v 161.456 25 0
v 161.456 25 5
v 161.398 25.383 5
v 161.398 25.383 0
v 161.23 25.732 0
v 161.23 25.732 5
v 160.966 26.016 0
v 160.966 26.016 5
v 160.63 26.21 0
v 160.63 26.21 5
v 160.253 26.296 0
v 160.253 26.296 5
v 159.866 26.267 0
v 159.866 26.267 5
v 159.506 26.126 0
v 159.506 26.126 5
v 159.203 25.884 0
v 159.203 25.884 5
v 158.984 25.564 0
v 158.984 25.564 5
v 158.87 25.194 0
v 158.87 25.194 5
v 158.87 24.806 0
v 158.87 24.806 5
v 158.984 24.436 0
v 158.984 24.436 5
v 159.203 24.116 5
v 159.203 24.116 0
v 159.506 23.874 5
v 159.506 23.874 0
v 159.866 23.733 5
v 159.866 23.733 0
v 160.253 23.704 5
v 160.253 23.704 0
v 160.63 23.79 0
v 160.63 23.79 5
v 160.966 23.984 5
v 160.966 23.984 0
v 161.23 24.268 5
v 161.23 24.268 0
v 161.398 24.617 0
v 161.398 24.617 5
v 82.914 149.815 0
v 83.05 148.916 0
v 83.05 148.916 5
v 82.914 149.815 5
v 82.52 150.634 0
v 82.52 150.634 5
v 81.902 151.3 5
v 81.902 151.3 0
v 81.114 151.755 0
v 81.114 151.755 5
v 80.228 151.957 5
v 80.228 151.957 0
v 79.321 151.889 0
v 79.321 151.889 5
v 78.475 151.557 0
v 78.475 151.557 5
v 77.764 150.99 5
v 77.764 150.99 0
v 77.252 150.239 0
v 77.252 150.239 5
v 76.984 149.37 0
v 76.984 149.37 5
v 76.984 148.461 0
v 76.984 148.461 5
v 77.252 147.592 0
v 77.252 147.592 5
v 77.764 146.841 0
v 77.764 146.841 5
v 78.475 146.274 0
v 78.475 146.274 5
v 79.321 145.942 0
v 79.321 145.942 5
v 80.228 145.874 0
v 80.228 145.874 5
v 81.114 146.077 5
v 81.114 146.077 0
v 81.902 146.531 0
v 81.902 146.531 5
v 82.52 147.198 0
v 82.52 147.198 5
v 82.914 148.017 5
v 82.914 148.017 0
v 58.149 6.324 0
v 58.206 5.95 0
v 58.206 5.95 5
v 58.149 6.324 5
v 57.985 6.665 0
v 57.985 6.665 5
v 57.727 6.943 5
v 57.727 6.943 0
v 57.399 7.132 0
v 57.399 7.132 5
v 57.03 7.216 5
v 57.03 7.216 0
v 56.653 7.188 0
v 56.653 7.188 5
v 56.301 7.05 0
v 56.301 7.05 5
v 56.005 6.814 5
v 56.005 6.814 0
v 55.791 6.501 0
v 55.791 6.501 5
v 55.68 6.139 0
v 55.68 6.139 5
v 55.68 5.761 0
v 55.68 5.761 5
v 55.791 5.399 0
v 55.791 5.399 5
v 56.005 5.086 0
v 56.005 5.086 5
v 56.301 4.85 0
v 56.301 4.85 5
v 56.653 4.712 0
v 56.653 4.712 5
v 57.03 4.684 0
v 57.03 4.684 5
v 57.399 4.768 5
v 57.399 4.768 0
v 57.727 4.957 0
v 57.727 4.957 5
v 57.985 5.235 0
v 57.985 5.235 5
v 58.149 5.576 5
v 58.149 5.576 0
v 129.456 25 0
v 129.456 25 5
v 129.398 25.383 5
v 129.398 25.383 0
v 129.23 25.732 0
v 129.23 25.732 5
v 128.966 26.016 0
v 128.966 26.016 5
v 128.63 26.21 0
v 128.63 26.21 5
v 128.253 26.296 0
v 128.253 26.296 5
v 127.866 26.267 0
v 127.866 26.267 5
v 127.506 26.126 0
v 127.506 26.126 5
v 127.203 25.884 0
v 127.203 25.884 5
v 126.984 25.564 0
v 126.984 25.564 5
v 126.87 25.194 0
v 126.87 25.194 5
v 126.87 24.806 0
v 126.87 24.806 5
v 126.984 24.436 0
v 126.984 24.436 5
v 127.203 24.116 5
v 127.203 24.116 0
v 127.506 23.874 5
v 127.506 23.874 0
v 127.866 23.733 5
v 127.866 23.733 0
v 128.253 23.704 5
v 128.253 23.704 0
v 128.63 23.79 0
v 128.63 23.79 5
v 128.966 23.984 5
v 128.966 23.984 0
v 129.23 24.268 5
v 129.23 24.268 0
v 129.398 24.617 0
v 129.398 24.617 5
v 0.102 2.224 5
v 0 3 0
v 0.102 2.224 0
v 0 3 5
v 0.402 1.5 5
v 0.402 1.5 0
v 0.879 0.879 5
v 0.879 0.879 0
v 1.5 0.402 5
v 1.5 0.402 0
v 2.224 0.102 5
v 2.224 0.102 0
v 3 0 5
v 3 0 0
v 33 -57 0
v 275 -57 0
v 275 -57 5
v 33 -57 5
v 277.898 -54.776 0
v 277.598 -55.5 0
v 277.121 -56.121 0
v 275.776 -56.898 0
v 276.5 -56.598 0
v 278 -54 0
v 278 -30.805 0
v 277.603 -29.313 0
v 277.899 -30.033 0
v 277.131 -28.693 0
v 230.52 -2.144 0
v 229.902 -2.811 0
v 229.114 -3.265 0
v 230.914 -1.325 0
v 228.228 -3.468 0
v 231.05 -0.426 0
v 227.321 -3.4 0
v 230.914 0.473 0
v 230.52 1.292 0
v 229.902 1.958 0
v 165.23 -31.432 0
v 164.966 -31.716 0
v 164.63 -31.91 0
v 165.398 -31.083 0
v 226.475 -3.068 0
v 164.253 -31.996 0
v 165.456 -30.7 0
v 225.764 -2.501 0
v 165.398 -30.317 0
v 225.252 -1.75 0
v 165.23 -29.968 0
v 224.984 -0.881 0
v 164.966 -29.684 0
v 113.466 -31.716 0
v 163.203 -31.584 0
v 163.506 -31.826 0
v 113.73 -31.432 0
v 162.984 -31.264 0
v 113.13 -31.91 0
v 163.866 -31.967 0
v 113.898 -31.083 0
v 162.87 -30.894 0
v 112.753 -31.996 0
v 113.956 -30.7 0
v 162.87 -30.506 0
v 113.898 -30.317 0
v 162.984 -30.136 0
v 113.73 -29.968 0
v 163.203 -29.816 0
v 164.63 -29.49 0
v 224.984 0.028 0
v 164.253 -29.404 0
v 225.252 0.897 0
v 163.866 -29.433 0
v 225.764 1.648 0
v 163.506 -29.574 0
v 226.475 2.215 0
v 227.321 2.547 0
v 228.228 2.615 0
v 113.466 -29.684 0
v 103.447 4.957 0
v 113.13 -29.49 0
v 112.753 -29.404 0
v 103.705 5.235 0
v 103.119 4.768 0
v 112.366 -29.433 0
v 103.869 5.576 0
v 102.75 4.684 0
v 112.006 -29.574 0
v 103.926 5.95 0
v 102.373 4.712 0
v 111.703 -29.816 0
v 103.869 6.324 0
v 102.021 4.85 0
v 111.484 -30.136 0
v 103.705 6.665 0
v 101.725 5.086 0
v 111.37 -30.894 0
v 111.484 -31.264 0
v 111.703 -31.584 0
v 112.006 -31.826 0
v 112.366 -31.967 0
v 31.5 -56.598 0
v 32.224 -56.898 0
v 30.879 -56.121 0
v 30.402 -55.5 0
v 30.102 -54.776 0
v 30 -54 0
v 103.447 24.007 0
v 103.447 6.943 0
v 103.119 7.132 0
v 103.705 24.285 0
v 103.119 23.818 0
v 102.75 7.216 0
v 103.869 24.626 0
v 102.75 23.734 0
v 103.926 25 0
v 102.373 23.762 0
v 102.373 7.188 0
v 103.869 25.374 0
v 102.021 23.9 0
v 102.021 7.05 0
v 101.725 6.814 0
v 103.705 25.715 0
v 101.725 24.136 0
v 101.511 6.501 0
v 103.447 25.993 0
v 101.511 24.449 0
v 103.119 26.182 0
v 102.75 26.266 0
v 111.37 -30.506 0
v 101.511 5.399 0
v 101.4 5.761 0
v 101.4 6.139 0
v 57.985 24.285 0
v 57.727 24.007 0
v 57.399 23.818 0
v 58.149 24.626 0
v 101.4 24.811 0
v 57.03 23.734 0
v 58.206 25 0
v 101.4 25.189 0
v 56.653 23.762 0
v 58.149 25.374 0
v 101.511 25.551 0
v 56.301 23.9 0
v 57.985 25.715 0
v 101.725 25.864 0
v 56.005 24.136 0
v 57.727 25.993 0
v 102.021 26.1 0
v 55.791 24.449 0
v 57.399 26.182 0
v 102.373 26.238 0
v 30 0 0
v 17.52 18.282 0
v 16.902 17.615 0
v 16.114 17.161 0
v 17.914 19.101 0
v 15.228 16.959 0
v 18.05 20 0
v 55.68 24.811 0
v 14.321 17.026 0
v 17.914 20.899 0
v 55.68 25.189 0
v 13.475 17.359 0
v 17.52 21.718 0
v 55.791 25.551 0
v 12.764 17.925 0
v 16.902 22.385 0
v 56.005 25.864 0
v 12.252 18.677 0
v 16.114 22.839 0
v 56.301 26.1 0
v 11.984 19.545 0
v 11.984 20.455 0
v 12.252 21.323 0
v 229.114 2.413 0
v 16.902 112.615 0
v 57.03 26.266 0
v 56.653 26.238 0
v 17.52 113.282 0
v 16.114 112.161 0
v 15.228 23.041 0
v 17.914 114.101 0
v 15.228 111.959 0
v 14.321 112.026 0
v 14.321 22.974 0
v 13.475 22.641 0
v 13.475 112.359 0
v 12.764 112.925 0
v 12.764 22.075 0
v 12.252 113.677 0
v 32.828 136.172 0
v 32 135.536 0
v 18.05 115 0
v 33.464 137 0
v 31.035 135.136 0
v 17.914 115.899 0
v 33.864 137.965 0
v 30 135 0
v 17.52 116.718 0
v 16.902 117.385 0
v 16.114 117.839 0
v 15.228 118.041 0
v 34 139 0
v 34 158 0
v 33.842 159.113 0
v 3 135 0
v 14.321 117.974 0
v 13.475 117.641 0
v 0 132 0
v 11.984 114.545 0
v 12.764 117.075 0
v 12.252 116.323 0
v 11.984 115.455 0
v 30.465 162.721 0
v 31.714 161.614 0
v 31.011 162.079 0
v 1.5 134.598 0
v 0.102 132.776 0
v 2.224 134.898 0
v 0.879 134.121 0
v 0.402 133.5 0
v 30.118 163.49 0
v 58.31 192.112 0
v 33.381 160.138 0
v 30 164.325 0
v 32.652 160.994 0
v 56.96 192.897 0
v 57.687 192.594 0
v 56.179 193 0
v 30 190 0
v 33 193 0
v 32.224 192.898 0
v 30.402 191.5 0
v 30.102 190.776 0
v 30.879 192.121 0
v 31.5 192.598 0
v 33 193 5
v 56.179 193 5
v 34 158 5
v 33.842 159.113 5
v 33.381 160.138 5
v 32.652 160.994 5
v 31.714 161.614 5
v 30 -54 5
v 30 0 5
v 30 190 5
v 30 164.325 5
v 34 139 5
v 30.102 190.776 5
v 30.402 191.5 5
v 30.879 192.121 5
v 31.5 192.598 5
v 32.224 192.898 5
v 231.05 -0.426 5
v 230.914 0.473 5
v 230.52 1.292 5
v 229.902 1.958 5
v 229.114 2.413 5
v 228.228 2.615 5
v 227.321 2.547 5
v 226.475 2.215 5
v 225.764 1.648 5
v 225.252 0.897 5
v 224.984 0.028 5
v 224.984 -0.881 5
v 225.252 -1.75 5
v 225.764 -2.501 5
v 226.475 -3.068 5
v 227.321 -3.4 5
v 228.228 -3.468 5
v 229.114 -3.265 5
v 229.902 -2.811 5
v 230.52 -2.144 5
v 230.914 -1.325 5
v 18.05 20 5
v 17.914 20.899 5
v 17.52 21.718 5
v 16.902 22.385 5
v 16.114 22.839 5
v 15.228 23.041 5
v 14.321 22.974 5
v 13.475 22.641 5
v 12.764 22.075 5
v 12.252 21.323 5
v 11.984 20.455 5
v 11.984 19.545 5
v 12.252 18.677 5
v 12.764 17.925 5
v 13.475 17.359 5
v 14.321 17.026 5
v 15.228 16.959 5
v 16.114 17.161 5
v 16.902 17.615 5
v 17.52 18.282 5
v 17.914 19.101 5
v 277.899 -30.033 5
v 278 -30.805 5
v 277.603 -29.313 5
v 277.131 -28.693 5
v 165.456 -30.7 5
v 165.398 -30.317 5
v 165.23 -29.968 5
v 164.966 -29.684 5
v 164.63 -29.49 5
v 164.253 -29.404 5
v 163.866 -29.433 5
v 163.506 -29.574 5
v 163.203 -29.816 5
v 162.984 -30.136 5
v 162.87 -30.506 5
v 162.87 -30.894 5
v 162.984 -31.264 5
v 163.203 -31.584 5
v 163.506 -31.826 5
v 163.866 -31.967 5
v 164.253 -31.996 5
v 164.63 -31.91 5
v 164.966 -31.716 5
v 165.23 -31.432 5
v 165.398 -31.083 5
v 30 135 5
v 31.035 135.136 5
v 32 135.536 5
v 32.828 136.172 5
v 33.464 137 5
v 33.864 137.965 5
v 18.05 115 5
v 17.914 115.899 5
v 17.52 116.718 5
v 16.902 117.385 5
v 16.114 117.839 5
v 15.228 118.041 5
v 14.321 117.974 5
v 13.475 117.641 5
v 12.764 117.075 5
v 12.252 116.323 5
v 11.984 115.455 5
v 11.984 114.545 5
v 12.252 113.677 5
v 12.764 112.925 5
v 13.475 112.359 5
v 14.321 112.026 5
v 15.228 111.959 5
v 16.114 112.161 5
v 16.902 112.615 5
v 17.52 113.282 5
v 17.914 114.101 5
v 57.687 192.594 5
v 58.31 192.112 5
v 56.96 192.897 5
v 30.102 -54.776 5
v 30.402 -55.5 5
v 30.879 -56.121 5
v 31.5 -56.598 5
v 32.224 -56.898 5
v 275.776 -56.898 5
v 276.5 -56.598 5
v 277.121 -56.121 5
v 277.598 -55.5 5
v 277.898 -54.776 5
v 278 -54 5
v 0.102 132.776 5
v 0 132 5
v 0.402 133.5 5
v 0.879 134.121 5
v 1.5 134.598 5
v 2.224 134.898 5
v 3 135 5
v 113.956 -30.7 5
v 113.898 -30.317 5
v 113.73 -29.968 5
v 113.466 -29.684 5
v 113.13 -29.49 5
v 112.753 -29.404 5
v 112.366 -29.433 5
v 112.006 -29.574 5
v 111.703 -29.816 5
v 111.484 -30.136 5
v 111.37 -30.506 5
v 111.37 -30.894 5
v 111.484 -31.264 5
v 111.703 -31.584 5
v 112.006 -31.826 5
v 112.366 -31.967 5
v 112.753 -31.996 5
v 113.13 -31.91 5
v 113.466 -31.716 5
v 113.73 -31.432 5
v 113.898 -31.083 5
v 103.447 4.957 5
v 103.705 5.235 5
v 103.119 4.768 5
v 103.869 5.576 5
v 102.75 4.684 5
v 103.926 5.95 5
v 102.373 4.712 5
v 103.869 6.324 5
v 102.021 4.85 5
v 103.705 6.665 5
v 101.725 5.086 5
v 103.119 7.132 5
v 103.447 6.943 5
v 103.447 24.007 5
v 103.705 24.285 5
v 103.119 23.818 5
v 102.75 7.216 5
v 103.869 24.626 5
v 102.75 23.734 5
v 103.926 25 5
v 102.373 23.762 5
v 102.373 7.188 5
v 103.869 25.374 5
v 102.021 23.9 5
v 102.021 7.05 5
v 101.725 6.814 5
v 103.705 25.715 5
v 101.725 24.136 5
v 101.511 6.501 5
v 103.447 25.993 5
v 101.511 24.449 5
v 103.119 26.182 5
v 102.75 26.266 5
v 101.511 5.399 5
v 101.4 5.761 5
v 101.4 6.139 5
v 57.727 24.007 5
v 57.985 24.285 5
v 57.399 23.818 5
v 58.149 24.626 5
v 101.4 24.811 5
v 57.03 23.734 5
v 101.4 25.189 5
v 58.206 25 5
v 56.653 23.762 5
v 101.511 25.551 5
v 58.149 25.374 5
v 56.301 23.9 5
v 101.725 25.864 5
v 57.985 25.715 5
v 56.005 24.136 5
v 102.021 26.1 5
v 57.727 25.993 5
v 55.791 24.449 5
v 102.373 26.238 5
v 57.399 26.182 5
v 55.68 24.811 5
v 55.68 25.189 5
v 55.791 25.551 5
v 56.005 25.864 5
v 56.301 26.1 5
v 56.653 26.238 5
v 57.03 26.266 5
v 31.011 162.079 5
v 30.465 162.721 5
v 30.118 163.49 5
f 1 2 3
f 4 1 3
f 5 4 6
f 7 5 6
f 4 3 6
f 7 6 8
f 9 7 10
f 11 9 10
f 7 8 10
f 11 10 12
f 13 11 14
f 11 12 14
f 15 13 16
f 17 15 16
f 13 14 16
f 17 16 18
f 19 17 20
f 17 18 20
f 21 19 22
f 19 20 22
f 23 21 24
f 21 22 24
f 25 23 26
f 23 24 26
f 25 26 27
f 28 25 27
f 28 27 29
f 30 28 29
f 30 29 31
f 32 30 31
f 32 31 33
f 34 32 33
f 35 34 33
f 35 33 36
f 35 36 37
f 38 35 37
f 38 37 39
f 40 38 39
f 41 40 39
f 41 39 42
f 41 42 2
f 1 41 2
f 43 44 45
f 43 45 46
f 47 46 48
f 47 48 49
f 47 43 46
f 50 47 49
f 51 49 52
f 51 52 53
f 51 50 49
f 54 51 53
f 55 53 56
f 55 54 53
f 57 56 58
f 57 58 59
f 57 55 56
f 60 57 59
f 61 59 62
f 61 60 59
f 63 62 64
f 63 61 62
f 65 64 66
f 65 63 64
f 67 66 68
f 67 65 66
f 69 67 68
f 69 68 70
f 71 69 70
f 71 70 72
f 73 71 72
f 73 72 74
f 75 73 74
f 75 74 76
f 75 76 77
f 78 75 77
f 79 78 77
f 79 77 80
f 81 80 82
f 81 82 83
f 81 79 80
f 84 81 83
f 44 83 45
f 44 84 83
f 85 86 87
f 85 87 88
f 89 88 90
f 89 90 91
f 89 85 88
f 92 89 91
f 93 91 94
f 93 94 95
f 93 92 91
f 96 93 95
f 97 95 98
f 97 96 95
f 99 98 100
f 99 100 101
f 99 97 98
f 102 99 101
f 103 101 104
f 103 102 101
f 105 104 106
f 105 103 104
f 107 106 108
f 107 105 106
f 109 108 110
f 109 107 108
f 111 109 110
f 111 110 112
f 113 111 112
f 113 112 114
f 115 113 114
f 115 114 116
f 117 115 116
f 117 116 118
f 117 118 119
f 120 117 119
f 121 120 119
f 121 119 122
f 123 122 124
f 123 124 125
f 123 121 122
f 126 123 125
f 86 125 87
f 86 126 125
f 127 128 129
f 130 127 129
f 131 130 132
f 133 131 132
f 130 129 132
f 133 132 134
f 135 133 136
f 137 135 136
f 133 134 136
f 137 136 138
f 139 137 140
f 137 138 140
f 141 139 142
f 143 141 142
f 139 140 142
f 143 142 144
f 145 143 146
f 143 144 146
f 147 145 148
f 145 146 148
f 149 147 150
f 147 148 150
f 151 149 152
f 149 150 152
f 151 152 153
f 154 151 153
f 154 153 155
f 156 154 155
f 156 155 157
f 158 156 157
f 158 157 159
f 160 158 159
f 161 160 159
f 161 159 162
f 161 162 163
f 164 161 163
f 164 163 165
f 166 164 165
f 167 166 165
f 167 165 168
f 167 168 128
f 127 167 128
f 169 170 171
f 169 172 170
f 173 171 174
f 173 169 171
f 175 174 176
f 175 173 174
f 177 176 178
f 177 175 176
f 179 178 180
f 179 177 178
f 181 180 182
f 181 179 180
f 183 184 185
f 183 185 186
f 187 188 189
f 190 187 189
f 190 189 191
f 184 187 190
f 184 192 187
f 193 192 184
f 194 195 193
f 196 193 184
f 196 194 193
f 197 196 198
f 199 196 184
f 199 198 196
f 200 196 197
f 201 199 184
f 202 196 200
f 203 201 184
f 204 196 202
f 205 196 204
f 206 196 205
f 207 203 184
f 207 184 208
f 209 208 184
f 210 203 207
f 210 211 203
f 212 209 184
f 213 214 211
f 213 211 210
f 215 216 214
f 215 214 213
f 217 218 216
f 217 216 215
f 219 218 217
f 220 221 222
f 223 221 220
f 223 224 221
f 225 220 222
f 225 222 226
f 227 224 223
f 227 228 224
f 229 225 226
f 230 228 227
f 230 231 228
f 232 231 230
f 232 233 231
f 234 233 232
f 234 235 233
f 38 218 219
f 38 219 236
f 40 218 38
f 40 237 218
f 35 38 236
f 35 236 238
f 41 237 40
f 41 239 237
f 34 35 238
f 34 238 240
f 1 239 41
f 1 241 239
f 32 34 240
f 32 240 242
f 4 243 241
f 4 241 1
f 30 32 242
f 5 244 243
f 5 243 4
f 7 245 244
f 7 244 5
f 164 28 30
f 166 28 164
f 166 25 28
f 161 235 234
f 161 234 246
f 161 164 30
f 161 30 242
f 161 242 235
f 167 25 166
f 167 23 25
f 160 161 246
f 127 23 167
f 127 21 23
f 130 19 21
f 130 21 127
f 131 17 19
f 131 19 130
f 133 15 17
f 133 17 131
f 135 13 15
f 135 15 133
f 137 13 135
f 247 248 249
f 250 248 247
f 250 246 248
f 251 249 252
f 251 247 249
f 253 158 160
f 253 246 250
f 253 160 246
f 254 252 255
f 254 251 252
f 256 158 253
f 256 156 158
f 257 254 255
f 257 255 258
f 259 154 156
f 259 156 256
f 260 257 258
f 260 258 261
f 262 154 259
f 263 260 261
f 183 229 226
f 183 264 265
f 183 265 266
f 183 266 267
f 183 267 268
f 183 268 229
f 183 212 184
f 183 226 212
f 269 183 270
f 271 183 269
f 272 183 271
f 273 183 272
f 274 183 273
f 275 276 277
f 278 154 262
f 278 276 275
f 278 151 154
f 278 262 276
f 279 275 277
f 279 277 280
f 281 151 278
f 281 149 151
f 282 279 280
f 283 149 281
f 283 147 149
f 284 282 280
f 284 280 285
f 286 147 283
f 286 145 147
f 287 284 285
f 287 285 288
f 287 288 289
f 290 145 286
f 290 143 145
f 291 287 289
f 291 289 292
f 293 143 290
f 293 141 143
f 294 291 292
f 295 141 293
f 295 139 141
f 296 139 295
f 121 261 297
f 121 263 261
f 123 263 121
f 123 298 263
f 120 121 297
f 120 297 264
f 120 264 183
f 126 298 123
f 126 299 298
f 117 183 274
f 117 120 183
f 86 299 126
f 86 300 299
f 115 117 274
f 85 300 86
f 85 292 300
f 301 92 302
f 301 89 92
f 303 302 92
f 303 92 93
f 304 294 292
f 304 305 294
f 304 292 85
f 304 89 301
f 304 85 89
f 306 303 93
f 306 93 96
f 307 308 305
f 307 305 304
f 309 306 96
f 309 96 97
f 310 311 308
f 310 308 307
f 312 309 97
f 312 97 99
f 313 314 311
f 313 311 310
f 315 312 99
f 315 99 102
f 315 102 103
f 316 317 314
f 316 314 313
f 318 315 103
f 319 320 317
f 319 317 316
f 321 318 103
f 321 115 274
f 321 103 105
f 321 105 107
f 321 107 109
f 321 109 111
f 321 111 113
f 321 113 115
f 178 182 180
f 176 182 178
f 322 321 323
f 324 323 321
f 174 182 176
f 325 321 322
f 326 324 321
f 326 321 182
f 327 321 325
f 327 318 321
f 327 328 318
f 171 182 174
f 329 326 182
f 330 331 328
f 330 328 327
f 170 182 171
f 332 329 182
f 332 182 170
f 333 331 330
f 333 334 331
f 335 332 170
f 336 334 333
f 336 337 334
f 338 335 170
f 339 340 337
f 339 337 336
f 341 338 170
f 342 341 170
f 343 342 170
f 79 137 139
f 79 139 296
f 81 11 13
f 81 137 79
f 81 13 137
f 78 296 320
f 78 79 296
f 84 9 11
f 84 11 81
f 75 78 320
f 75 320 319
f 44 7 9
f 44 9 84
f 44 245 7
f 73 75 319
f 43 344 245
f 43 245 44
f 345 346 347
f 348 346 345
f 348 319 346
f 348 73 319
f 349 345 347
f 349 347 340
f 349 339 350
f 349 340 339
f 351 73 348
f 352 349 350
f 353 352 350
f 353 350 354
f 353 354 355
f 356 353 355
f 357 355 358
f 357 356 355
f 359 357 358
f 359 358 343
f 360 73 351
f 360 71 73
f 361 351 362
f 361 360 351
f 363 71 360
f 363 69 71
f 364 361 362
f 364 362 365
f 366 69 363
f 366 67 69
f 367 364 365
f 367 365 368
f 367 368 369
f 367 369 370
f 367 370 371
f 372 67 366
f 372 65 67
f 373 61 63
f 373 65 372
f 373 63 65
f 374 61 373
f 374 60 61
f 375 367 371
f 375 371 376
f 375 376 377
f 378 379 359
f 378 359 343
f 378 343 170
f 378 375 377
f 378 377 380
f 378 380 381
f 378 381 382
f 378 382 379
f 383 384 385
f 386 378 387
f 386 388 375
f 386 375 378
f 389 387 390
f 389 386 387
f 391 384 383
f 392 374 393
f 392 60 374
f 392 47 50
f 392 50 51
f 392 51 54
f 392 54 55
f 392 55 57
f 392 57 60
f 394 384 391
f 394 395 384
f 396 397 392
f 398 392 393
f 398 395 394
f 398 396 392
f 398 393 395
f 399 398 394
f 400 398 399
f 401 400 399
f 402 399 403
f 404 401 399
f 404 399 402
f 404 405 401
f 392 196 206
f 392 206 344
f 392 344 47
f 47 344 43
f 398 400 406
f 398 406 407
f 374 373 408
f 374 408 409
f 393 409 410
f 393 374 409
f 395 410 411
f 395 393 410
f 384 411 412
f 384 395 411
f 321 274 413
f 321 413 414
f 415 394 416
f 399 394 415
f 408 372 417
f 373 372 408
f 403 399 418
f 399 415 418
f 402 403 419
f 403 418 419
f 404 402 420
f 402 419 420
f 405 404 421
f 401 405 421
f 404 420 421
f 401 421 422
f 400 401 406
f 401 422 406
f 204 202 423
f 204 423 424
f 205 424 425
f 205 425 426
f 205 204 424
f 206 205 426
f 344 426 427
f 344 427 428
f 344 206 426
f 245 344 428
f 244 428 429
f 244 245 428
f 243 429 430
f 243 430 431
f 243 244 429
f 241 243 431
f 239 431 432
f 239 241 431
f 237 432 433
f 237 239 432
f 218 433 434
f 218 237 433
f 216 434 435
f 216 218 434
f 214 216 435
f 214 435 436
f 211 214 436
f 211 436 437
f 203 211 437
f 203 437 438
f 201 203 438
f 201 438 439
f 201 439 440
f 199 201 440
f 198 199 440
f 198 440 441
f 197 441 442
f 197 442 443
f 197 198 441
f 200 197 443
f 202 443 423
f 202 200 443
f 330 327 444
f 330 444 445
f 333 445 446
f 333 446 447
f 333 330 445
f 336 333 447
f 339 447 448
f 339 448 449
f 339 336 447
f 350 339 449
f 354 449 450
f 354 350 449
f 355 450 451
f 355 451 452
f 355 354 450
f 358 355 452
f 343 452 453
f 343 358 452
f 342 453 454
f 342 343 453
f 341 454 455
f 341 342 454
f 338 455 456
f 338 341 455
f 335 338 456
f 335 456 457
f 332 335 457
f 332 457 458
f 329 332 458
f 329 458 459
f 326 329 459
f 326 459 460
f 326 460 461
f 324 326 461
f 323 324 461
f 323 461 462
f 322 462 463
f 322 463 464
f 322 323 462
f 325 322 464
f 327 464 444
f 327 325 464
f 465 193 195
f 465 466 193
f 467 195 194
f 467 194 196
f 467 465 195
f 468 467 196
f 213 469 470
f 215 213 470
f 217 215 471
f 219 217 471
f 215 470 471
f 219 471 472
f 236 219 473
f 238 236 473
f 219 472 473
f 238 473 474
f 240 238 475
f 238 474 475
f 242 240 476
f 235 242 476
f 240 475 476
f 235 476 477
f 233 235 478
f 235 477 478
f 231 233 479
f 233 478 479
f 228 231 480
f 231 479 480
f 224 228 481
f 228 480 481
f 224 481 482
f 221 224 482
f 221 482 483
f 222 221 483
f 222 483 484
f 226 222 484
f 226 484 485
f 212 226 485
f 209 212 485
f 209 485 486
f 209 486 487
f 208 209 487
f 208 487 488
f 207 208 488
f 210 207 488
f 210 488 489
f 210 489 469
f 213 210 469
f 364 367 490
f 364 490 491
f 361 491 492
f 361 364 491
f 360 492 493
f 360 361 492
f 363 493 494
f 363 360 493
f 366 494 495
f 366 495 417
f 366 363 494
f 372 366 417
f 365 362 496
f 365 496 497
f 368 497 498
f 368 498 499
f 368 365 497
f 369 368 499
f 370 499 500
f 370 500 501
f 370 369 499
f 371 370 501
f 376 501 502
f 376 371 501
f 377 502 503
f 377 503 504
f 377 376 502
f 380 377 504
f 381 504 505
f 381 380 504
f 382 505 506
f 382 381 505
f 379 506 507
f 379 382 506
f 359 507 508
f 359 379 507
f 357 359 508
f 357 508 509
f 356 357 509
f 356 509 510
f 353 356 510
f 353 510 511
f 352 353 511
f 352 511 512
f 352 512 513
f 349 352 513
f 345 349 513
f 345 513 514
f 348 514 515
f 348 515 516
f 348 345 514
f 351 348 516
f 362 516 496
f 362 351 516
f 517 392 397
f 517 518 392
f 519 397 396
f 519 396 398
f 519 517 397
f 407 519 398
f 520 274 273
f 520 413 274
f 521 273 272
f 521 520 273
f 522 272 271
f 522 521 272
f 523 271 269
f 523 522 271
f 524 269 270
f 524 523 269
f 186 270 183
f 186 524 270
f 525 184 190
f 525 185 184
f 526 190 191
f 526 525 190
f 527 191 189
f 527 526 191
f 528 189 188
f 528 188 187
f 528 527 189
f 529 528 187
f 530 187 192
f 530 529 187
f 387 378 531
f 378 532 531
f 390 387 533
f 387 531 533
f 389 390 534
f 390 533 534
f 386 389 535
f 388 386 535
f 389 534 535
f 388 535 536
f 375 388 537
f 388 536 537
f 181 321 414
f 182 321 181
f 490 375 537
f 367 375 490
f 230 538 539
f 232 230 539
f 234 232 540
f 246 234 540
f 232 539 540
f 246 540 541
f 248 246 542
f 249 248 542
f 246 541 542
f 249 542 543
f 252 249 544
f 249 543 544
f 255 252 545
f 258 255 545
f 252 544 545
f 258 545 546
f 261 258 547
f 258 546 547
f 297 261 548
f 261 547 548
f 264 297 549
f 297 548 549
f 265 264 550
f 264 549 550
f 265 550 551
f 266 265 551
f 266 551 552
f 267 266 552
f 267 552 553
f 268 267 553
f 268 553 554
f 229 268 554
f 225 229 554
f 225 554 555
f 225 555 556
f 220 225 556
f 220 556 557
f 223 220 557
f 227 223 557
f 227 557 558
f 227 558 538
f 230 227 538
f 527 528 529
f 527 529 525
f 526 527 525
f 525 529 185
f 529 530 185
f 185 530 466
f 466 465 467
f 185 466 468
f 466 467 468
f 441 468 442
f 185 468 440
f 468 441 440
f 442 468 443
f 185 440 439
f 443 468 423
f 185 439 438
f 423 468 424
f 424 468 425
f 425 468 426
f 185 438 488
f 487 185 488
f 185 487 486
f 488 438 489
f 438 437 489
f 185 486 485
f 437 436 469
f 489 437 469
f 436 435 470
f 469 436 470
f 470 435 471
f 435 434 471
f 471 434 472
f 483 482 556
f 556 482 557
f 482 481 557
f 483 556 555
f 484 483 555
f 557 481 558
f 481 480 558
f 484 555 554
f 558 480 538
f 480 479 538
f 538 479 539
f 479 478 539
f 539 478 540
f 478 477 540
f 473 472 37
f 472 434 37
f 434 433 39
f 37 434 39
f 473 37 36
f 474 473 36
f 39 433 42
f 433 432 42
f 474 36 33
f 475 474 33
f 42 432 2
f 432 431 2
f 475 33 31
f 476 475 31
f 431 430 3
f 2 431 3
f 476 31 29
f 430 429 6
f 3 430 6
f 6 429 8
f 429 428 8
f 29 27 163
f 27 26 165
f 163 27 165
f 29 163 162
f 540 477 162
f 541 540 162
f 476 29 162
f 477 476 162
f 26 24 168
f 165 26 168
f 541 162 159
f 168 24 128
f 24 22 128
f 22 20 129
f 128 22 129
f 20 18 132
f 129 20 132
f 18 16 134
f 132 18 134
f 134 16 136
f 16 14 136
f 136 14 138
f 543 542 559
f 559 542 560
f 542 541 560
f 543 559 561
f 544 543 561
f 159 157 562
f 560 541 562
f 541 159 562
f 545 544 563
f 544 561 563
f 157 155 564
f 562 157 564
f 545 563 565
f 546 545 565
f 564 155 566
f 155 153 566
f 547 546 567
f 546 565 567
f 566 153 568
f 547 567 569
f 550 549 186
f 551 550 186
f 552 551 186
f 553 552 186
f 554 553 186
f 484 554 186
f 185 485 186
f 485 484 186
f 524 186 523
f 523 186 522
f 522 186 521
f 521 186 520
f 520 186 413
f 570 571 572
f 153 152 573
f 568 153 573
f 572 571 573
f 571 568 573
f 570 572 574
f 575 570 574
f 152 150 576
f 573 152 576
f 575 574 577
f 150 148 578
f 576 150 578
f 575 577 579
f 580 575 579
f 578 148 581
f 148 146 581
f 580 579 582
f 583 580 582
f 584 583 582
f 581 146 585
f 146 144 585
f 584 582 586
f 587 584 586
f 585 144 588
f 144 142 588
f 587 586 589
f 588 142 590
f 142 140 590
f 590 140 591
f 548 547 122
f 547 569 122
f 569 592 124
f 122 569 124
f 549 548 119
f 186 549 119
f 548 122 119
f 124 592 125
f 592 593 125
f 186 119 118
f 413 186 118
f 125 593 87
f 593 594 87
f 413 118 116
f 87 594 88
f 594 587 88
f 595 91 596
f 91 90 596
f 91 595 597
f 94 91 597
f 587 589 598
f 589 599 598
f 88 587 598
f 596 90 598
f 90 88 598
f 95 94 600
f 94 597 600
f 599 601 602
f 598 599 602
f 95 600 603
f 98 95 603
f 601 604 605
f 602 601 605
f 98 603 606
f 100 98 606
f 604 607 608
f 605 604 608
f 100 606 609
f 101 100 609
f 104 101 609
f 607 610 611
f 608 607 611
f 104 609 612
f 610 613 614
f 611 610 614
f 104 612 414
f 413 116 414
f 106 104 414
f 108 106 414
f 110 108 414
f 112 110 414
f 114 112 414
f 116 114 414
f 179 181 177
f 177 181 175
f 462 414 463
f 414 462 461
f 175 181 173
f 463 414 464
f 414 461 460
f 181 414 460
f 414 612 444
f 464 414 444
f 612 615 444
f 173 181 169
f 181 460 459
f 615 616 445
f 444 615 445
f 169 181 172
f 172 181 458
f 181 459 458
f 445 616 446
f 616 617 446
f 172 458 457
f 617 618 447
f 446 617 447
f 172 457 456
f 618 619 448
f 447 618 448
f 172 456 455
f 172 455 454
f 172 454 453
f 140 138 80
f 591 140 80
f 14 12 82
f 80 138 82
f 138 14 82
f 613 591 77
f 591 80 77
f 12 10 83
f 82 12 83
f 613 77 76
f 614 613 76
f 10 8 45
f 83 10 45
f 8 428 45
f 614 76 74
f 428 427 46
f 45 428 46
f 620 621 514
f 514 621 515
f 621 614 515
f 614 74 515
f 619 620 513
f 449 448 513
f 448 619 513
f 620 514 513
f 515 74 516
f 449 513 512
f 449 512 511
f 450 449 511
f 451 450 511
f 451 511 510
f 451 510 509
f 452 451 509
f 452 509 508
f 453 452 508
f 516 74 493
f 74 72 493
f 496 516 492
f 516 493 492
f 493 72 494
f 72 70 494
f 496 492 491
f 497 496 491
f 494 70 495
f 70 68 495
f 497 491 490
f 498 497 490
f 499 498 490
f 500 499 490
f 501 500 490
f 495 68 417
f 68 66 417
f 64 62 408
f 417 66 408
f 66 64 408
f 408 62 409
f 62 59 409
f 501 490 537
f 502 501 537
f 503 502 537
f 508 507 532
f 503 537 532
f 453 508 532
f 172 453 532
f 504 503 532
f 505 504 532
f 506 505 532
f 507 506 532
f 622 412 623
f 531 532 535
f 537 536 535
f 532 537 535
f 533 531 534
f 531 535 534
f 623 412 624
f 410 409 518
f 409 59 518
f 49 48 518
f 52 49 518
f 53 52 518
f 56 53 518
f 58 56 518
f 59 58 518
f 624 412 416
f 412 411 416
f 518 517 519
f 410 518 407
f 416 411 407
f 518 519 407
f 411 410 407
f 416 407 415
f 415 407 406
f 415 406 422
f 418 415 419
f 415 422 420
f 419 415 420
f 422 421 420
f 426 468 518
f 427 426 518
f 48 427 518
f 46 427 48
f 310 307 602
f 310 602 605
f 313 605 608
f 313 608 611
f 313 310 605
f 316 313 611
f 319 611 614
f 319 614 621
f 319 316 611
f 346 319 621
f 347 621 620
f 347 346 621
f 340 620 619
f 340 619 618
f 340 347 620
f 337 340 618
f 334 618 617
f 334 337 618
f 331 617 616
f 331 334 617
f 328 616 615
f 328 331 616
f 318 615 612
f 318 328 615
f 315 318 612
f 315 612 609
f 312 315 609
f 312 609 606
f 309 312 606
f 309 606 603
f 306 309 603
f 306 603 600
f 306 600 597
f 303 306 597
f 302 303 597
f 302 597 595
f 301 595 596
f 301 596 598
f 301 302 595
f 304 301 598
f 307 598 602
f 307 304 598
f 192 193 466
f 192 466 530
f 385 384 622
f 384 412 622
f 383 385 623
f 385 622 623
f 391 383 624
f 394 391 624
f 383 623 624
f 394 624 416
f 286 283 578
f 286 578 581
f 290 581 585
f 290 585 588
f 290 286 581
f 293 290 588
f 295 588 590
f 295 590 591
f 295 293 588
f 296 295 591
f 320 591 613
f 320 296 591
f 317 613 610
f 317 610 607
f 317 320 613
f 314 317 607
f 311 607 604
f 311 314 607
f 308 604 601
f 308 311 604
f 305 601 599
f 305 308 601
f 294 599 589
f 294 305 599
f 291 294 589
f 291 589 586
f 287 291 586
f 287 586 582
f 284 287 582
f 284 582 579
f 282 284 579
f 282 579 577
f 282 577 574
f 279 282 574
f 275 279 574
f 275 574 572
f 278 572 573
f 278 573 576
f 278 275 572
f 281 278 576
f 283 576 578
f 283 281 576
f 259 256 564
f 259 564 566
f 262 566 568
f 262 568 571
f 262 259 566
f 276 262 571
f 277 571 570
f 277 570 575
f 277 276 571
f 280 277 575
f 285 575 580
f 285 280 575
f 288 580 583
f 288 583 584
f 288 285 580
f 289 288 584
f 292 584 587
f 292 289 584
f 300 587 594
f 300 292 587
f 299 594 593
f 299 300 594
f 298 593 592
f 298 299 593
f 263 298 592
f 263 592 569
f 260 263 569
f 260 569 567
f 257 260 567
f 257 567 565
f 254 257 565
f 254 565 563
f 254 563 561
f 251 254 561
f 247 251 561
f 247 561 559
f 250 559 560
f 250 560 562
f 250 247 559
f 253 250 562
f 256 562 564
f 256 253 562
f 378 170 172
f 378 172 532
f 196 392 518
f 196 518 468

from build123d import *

# Parameters (mm, degrees)
SKETCH1_R           = 3.05
SKETCH1_R_2         = 1.27
BOSS_EXTRUDE1_DEPTH = 5
FILLET1_R           = 3
SKETCH2_R           = 1.3
CUT_EXTRUDE1_DEPTH  = 339.464178311


with BuildPart() as part:
    # Sketch1 → Boss-Extrude1 (new body)
    with BuildSketch(Plane.XY):
        with BuildLine():
            Line((0, 0), (0, 135))
            Line((0, 135), (30, 135))
            ThreePointArc((30, 135), (32.828427125, 136.171572875), (34, 139))
            Line((34, 139), (34, 158))
            ThreePointArc((34, 158), (32.828427125, 160.828427125), (30, 162))
            Line((30, 162), (30, 193))
            Line((30, 193), (57.43, 193))
            Line((57.43, 193), (278, -29.57))
            Line((278, -29.57), (278, -57))
            Line((278, -57), (30, -57))
            Line((30, -57), (30, 0))
            Line((30, 0), (0, 0))
        make_face()
        with Locations((15, 115)):
            Circle(SKETCH1_R, mode=Mode.SUBTRACT)
        with Locations((15, 20)):
            Circle(SKETCH1_R, mode=Mode.SUBTRACT)
        with Locations((80, 148.915753479)):
            Circle(SKETCH1_R, mode=Mode.SUBTRACT)
        with Locations((228, -0.426224125)):
            Circle(SKETCH1_R, mode=Mode.SUBTRACT)
        with Locations((56.935507079, 25)):
            Circle(SKETCH1_R_2, mode=Mode.SUBTRACT)
        with Locations((102.655507079, 25)):
            Circle(SKETCH1_R_2, mode=Mode.SUBTRACT)
        with Locations((102.655507079, 5.95)):
            Circle(SKETCH1_R_2, mode=Mode.SUBTRACT)
        with Locations((56.935507079, 5.95)):
            Circle(SKETCH1_R_2, mode=Mode.SUBTRACT)
    extrude(amount=BOSS_EXTRUDE1_DEPTH)

    # Fillet1
    fillet1_edges = [part.edges().sort_by_distance(p)[0] for p in [
        (30, 162, 2.5),
        (30, 193, 2.5),
        (57.43, 193, 2.5),
        (278, -29.57, 2.5),
        (278, -57, 2.5),
        (30, -57, 2.5),
        (0, 0, 2.5),
        (0, 135, 2.5),
    ]]
    fillet(fillet1_edges, radius=FILLET1_R)

    # Sketch2 → Cut-Extrude1 (cut, through all)
    with BuildSketch(Plane.XY.offset(5)):
        with Locations((112.655507079, -30.7)):
            Circle(SKETCH2_R)
        with Locations((164.155507079, -30.7)):
            Circle(SKETCH2_R)
        with Locations((128.155507079, 25)):
            Circle(SKETCH2_R)
        with Locations((160.155507079, 25)):
            Circle(SKETCH2_R)
    extrude(amount=-CUT_EXTRUDE1_DEPTH, mode=Mode.SUBTRACT)


solid = part.part
